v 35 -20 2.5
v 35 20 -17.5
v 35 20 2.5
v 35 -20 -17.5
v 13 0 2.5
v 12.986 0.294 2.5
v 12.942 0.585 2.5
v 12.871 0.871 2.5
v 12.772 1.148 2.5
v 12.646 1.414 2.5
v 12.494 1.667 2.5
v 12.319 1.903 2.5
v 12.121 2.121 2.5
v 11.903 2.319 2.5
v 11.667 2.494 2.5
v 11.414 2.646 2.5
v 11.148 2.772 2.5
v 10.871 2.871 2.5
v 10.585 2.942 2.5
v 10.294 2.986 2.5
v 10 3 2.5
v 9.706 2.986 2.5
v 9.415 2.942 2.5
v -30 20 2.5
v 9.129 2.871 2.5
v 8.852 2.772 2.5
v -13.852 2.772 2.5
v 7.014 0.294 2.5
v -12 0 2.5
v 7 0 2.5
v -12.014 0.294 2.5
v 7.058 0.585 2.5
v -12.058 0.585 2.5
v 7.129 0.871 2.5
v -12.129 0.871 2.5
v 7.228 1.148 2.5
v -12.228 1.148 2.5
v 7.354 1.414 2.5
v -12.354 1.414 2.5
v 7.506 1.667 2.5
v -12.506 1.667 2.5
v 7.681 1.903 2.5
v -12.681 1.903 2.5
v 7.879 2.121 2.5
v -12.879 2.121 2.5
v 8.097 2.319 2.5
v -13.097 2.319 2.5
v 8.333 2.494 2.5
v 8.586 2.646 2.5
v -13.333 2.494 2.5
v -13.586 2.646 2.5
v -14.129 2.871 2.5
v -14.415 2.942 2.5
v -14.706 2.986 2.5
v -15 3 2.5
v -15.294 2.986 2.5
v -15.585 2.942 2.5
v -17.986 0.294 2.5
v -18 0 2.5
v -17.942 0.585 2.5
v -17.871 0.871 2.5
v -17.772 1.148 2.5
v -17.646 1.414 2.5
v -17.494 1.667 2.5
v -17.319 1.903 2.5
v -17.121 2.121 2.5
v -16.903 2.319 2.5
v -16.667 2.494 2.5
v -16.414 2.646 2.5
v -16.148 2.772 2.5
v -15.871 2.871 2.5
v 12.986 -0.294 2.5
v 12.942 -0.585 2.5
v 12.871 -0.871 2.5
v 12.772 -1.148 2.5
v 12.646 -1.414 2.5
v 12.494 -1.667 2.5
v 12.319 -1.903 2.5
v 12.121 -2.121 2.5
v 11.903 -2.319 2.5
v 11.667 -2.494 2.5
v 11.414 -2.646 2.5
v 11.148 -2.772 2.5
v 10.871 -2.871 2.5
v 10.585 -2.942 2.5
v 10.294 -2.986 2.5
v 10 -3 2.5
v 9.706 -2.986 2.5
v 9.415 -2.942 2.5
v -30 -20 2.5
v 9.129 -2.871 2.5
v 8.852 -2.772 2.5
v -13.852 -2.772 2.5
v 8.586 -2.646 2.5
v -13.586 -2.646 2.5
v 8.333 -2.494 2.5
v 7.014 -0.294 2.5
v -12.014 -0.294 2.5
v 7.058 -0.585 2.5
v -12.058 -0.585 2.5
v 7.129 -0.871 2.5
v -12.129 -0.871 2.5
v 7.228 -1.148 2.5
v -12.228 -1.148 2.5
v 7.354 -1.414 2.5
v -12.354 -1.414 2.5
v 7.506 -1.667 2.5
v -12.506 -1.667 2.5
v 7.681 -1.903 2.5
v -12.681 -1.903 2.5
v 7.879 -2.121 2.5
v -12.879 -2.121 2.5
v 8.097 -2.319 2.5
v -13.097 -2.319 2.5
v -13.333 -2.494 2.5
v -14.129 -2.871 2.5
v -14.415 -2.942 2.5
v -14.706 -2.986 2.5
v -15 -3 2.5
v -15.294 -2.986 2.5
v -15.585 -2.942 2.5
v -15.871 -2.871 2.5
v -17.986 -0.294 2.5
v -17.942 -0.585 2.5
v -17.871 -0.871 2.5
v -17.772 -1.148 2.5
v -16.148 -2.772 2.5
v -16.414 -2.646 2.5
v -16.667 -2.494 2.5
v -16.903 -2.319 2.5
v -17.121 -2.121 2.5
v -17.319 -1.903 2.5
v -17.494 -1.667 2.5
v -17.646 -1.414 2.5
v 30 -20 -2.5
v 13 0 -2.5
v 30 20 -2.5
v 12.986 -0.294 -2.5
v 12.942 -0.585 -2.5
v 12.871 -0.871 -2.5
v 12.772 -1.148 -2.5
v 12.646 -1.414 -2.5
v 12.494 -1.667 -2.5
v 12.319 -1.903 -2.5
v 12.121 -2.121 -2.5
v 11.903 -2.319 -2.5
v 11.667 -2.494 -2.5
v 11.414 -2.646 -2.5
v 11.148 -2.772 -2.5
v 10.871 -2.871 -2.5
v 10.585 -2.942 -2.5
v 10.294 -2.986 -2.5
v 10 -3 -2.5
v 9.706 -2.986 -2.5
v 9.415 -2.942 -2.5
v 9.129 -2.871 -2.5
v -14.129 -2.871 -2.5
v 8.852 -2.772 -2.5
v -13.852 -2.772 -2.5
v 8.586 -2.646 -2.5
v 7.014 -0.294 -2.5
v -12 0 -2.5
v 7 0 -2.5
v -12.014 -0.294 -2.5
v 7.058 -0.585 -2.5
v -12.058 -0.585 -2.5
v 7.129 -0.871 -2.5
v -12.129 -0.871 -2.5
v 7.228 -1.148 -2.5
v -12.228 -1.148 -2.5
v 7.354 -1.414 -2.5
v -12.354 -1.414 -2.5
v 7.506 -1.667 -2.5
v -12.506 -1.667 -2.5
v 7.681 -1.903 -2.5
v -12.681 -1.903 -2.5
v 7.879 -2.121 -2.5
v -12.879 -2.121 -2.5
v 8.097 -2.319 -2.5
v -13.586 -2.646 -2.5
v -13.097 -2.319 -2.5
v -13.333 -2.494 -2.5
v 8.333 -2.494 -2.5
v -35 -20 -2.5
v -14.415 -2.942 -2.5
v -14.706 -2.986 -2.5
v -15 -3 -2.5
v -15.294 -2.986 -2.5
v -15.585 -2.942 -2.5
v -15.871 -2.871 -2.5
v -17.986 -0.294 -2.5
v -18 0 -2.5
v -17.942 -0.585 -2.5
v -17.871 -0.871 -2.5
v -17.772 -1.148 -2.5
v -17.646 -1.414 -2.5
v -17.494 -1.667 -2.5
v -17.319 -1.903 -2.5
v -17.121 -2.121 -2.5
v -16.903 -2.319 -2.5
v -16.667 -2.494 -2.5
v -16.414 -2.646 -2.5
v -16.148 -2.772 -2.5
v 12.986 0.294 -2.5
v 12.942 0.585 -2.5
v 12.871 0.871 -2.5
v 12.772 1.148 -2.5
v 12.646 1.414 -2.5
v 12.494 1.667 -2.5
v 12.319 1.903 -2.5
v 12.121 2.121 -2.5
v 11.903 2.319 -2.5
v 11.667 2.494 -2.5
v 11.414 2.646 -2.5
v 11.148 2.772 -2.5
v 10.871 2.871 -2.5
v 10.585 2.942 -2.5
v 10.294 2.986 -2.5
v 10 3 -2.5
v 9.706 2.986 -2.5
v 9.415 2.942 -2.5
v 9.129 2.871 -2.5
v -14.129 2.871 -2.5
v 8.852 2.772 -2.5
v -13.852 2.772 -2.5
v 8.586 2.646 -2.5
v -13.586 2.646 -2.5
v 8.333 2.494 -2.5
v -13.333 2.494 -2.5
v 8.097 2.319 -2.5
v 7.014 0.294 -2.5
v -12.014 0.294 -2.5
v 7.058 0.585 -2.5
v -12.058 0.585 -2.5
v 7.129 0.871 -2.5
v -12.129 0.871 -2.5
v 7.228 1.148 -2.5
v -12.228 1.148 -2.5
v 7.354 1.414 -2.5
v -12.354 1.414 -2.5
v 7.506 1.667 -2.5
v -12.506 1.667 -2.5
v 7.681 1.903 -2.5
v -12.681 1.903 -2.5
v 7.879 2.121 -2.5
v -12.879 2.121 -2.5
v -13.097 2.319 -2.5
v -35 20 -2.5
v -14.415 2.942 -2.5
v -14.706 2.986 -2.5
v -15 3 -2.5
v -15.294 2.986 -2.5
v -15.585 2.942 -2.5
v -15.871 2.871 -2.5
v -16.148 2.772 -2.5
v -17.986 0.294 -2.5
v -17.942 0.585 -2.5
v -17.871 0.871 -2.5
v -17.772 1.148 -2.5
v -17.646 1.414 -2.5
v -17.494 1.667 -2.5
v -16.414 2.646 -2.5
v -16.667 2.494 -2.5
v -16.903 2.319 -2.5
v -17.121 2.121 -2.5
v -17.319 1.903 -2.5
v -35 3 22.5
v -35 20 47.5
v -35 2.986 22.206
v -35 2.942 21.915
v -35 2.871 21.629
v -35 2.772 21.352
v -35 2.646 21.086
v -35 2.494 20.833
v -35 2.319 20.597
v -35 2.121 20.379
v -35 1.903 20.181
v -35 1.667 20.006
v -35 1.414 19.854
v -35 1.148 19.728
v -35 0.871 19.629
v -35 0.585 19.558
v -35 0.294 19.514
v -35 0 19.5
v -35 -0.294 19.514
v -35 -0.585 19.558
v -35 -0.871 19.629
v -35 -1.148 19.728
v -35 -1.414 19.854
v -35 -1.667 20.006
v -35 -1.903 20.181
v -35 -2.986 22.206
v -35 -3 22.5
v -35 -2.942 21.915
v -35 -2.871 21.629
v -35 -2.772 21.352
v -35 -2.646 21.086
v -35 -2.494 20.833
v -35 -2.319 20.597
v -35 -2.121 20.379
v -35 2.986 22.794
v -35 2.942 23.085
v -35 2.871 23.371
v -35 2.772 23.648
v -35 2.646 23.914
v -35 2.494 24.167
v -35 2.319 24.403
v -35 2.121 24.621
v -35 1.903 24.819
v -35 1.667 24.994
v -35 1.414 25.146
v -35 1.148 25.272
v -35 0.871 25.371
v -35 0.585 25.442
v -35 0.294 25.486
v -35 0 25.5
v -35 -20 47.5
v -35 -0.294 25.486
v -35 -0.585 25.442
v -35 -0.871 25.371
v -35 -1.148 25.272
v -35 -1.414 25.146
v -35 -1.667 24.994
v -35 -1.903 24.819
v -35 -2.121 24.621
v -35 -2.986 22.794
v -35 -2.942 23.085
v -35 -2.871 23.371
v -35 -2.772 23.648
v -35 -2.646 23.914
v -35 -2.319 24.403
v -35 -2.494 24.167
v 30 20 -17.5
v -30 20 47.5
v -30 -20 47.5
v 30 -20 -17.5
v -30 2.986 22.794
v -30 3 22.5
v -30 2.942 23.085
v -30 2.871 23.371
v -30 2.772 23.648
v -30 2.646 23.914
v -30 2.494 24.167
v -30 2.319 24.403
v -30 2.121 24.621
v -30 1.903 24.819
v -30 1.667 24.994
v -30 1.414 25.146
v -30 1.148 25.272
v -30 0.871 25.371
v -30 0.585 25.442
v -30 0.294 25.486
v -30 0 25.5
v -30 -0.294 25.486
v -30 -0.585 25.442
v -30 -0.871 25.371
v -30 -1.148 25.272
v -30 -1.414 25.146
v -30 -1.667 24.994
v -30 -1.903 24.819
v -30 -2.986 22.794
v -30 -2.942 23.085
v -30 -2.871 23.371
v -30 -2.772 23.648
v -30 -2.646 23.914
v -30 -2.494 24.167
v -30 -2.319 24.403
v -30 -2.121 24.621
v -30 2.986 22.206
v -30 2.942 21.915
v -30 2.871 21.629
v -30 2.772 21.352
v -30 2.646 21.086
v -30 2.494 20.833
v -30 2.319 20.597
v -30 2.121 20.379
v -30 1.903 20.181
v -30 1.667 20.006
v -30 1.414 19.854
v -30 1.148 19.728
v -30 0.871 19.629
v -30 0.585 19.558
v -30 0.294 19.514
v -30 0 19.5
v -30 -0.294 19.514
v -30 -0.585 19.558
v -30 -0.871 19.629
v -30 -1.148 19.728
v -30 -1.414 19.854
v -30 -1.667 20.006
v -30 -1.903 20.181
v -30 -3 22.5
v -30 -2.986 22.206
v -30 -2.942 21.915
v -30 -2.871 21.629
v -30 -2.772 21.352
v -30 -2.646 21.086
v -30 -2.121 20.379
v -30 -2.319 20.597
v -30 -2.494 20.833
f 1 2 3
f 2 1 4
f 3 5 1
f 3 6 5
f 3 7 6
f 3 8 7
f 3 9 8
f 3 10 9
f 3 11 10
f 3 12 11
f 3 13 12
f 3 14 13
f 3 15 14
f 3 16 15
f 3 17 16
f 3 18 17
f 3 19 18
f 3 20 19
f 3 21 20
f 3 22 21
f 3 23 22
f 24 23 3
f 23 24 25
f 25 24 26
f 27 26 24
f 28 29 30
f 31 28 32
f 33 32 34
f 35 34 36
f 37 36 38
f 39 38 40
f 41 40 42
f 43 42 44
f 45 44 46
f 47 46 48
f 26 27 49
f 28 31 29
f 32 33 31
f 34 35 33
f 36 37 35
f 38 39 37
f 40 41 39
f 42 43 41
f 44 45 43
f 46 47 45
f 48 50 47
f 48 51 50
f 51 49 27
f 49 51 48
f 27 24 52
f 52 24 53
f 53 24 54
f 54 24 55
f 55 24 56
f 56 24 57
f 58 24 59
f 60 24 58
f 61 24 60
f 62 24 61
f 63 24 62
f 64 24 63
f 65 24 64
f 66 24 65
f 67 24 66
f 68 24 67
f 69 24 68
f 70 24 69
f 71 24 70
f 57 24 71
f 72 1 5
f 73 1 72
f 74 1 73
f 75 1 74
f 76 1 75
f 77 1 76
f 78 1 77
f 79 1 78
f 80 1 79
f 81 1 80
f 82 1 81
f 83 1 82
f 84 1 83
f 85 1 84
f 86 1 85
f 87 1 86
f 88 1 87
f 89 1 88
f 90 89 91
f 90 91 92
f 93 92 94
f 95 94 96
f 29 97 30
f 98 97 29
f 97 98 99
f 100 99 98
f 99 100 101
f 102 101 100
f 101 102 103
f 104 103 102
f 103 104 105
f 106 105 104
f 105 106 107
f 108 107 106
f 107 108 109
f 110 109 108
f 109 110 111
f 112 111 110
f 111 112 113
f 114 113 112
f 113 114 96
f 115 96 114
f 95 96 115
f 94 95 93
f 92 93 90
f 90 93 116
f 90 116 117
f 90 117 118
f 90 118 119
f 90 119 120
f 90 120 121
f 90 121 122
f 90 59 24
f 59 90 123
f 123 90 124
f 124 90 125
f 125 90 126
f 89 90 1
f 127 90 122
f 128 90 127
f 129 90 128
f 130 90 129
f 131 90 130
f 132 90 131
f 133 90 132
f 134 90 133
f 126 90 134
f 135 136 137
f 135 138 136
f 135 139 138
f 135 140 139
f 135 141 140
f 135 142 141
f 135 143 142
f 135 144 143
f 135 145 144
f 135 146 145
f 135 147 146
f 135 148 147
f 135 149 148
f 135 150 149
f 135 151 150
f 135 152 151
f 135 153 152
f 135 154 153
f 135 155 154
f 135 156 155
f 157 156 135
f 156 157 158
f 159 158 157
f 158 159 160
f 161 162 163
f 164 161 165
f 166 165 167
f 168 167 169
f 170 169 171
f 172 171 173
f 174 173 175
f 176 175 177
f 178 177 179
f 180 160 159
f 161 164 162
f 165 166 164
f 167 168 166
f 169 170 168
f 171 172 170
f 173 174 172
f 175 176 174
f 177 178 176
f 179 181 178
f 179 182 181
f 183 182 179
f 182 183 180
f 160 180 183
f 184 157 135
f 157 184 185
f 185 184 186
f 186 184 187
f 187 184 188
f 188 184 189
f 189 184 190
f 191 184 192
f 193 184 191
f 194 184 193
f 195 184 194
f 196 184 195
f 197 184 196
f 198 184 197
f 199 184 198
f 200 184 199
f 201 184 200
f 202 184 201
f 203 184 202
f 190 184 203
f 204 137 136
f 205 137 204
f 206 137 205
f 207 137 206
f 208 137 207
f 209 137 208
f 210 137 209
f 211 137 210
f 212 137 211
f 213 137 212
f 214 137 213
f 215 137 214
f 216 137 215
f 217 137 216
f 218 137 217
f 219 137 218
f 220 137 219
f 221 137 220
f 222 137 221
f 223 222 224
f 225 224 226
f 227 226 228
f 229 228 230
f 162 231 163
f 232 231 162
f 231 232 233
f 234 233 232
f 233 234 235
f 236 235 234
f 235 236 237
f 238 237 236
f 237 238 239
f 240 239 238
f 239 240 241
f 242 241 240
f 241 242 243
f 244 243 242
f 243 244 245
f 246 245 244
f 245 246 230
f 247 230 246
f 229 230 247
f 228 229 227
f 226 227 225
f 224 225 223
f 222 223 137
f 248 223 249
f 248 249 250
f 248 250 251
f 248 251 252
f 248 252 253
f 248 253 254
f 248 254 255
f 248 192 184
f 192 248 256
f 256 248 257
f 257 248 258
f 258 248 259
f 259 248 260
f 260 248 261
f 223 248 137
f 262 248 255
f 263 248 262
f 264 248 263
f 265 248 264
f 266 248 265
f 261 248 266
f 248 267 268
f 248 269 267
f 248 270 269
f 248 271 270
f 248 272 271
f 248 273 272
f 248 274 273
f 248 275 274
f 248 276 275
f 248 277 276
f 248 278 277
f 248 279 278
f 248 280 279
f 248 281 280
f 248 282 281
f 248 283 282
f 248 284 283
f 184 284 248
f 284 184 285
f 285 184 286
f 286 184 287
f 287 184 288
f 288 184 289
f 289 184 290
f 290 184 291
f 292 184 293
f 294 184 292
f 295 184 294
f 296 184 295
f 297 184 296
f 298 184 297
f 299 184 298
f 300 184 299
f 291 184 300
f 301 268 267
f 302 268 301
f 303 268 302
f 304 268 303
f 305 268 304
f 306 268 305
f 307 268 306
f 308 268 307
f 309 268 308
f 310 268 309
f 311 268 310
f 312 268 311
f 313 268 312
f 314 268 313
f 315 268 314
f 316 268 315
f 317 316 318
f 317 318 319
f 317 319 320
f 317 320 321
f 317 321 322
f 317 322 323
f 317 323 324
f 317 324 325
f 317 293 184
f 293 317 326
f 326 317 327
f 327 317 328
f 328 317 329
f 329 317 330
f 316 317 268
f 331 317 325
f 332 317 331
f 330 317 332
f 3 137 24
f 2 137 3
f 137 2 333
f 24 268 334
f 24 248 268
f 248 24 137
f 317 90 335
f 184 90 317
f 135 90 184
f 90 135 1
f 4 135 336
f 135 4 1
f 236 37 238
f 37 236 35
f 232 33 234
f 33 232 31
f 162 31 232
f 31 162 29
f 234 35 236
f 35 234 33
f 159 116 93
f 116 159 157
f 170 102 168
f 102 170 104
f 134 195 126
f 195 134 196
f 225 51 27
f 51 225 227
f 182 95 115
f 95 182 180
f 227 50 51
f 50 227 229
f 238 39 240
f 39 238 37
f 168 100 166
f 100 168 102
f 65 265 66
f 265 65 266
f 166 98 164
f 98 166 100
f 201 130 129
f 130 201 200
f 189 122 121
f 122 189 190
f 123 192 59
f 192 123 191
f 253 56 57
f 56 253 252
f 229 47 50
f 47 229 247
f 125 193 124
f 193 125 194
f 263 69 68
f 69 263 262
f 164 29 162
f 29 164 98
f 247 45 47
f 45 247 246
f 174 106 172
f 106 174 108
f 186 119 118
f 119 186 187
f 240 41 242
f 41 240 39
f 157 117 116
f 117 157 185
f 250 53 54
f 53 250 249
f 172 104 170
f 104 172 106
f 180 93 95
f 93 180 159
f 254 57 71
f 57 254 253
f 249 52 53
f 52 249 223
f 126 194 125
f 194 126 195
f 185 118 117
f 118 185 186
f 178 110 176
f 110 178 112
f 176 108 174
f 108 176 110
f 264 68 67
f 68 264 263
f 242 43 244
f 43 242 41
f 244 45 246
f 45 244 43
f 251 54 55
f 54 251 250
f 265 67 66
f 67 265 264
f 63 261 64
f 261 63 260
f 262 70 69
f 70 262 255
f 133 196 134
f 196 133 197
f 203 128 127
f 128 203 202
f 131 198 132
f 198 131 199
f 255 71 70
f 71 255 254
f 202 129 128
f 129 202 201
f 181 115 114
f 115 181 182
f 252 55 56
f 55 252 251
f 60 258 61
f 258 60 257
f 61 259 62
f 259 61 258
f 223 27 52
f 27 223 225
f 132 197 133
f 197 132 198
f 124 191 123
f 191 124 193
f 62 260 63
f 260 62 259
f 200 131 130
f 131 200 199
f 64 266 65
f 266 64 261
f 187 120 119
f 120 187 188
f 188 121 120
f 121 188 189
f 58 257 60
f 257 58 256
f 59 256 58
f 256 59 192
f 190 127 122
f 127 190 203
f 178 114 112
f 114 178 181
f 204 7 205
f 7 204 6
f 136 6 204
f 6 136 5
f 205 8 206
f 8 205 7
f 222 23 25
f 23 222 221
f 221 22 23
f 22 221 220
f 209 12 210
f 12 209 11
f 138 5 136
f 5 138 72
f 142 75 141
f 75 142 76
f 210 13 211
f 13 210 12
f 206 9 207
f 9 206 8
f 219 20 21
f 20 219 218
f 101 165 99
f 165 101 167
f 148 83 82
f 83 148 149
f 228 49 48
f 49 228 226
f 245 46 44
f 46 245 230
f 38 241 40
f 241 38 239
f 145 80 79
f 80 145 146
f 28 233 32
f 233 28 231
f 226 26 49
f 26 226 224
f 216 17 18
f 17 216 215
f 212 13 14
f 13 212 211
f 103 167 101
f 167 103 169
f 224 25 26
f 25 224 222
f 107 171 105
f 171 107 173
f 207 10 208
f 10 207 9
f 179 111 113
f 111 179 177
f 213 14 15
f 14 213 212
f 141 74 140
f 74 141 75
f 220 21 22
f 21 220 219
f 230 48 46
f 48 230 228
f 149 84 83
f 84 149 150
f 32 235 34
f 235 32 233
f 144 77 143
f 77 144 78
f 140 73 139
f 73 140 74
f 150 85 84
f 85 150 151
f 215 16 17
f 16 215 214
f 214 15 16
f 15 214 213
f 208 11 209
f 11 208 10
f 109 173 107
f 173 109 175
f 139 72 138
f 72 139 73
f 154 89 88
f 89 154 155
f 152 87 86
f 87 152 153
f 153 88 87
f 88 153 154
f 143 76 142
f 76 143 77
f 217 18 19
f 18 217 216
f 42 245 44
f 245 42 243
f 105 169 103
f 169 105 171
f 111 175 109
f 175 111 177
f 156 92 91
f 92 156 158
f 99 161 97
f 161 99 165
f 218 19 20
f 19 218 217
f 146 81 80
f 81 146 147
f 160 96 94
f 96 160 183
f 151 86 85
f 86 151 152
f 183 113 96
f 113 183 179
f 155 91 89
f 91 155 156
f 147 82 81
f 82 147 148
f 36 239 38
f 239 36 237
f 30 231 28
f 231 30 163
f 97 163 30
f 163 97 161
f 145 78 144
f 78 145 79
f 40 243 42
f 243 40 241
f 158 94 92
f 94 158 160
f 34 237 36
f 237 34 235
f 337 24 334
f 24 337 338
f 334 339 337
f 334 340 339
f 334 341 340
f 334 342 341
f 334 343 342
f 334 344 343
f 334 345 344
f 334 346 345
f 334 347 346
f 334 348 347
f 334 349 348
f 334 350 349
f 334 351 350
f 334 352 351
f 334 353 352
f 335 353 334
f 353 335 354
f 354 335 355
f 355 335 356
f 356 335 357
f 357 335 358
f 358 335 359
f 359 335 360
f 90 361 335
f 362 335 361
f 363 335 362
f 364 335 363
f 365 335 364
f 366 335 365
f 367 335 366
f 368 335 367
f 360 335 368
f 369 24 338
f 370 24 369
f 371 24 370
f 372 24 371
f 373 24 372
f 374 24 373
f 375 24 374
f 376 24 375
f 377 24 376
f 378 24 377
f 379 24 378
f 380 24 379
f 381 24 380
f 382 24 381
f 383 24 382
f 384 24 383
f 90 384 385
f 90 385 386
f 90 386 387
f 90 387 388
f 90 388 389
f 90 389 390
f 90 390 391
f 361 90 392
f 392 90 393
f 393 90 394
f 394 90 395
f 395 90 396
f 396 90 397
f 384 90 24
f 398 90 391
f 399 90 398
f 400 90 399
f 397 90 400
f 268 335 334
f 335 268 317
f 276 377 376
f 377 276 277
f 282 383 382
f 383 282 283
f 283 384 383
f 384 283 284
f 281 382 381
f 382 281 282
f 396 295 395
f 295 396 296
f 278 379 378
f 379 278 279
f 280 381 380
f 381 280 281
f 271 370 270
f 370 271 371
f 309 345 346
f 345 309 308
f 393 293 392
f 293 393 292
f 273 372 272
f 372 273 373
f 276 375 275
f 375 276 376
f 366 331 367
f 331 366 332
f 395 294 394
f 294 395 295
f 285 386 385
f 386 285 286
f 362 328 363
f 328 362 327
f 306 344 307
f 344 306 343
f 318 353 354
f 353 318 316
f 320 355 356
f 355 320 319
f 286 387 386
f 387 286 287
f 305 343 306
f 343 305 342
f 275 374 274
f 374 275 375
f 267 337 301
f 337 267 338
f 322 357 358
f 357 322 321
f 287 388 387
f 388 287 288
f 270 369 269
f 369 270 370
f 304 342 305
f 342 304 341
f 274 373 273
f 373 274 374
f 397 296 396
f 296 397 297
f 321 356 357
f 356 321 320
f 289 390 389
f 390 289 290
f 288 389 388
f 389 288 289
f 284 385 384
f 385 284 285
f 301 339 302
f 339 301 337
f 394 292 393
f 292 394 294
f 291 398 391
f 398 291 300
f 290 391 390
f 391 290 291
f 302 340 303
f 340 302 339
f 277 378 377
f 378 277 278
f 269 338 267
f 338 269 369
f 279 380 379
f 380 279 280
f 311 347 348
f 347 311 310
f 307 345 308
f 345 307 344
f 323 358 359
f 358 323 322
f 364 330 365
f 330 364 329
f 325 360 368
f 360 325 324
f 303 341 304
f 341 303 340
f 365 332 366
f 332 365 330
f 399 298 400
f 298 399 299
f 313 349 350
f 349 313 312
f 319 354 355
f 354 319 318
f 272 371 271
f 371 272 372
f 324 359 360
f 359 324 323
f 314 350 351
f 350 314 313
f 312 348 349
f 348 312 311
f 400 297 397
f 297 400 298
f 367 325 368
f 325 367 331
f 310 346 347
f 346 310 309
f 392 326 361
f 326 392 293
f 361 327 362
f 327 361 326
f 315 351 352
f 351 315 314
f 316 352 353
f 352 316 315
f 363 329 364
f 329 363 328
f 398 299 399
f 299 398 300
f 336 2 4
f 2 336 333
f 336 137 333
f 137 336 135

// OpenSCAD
hole_thickness = 3;
$fn = 64;
model_center = true;

// Transformer mount
transformer_thickness = 5;
transformer_width = 60 + transformer_thickness*2;
transformer_depth = 40;
transformer_hole_spacing = 25;
transformer_hole_offset = 20;

// Wall mount
wall_mount_width = 50;
wall_mount_depth = transformer_depth;
wall_mount_thickness = transformer_thickness;

// Tab
tab_width = 20;
tab_depth = transformer_depth;
tab_thickness = transformer_thickness;

magic_value = transformer_thickness / 2;

// Transformer
difference() {
    cube([transformer_width,transformer_depth,transformer_thickness], center=model_center);
    translate([-(transformer_width/2)+transformer_hole_offset,0,0])
        cylinder(r=hole_thickness,h=transformer_thickness, center=model_center);
    translate([-(transformer_width/2)+transformer_hole_offset+transformer_hole_spacing,0,0])
        cylinder(r=hole_thickness,h=transformer_thickness, center=model_center);    
 }

// Wall
translate([(-transformer_width/2)+wall_mount_thickness/2,0,(wall_mount_width/2)-magic_value])
    rotate(90, [0,1,0])
        difference() {    
            cube([wall_mount_width,wall_mount_depth,wall_mount_thickness], center=model_center);
            cylinder(r=hole_thickness,h=transformer_thickness, center=model_center);
        }
        
// Tab
translate([-((-transformer_width/2)+tab_thickness/2),0,-(tab_width/2)+transformer_thickness-magic_value])
    rotate(90, [0,1,0])
        cube([tab_width,tab_depth,tab_thickness], center=model_center);
